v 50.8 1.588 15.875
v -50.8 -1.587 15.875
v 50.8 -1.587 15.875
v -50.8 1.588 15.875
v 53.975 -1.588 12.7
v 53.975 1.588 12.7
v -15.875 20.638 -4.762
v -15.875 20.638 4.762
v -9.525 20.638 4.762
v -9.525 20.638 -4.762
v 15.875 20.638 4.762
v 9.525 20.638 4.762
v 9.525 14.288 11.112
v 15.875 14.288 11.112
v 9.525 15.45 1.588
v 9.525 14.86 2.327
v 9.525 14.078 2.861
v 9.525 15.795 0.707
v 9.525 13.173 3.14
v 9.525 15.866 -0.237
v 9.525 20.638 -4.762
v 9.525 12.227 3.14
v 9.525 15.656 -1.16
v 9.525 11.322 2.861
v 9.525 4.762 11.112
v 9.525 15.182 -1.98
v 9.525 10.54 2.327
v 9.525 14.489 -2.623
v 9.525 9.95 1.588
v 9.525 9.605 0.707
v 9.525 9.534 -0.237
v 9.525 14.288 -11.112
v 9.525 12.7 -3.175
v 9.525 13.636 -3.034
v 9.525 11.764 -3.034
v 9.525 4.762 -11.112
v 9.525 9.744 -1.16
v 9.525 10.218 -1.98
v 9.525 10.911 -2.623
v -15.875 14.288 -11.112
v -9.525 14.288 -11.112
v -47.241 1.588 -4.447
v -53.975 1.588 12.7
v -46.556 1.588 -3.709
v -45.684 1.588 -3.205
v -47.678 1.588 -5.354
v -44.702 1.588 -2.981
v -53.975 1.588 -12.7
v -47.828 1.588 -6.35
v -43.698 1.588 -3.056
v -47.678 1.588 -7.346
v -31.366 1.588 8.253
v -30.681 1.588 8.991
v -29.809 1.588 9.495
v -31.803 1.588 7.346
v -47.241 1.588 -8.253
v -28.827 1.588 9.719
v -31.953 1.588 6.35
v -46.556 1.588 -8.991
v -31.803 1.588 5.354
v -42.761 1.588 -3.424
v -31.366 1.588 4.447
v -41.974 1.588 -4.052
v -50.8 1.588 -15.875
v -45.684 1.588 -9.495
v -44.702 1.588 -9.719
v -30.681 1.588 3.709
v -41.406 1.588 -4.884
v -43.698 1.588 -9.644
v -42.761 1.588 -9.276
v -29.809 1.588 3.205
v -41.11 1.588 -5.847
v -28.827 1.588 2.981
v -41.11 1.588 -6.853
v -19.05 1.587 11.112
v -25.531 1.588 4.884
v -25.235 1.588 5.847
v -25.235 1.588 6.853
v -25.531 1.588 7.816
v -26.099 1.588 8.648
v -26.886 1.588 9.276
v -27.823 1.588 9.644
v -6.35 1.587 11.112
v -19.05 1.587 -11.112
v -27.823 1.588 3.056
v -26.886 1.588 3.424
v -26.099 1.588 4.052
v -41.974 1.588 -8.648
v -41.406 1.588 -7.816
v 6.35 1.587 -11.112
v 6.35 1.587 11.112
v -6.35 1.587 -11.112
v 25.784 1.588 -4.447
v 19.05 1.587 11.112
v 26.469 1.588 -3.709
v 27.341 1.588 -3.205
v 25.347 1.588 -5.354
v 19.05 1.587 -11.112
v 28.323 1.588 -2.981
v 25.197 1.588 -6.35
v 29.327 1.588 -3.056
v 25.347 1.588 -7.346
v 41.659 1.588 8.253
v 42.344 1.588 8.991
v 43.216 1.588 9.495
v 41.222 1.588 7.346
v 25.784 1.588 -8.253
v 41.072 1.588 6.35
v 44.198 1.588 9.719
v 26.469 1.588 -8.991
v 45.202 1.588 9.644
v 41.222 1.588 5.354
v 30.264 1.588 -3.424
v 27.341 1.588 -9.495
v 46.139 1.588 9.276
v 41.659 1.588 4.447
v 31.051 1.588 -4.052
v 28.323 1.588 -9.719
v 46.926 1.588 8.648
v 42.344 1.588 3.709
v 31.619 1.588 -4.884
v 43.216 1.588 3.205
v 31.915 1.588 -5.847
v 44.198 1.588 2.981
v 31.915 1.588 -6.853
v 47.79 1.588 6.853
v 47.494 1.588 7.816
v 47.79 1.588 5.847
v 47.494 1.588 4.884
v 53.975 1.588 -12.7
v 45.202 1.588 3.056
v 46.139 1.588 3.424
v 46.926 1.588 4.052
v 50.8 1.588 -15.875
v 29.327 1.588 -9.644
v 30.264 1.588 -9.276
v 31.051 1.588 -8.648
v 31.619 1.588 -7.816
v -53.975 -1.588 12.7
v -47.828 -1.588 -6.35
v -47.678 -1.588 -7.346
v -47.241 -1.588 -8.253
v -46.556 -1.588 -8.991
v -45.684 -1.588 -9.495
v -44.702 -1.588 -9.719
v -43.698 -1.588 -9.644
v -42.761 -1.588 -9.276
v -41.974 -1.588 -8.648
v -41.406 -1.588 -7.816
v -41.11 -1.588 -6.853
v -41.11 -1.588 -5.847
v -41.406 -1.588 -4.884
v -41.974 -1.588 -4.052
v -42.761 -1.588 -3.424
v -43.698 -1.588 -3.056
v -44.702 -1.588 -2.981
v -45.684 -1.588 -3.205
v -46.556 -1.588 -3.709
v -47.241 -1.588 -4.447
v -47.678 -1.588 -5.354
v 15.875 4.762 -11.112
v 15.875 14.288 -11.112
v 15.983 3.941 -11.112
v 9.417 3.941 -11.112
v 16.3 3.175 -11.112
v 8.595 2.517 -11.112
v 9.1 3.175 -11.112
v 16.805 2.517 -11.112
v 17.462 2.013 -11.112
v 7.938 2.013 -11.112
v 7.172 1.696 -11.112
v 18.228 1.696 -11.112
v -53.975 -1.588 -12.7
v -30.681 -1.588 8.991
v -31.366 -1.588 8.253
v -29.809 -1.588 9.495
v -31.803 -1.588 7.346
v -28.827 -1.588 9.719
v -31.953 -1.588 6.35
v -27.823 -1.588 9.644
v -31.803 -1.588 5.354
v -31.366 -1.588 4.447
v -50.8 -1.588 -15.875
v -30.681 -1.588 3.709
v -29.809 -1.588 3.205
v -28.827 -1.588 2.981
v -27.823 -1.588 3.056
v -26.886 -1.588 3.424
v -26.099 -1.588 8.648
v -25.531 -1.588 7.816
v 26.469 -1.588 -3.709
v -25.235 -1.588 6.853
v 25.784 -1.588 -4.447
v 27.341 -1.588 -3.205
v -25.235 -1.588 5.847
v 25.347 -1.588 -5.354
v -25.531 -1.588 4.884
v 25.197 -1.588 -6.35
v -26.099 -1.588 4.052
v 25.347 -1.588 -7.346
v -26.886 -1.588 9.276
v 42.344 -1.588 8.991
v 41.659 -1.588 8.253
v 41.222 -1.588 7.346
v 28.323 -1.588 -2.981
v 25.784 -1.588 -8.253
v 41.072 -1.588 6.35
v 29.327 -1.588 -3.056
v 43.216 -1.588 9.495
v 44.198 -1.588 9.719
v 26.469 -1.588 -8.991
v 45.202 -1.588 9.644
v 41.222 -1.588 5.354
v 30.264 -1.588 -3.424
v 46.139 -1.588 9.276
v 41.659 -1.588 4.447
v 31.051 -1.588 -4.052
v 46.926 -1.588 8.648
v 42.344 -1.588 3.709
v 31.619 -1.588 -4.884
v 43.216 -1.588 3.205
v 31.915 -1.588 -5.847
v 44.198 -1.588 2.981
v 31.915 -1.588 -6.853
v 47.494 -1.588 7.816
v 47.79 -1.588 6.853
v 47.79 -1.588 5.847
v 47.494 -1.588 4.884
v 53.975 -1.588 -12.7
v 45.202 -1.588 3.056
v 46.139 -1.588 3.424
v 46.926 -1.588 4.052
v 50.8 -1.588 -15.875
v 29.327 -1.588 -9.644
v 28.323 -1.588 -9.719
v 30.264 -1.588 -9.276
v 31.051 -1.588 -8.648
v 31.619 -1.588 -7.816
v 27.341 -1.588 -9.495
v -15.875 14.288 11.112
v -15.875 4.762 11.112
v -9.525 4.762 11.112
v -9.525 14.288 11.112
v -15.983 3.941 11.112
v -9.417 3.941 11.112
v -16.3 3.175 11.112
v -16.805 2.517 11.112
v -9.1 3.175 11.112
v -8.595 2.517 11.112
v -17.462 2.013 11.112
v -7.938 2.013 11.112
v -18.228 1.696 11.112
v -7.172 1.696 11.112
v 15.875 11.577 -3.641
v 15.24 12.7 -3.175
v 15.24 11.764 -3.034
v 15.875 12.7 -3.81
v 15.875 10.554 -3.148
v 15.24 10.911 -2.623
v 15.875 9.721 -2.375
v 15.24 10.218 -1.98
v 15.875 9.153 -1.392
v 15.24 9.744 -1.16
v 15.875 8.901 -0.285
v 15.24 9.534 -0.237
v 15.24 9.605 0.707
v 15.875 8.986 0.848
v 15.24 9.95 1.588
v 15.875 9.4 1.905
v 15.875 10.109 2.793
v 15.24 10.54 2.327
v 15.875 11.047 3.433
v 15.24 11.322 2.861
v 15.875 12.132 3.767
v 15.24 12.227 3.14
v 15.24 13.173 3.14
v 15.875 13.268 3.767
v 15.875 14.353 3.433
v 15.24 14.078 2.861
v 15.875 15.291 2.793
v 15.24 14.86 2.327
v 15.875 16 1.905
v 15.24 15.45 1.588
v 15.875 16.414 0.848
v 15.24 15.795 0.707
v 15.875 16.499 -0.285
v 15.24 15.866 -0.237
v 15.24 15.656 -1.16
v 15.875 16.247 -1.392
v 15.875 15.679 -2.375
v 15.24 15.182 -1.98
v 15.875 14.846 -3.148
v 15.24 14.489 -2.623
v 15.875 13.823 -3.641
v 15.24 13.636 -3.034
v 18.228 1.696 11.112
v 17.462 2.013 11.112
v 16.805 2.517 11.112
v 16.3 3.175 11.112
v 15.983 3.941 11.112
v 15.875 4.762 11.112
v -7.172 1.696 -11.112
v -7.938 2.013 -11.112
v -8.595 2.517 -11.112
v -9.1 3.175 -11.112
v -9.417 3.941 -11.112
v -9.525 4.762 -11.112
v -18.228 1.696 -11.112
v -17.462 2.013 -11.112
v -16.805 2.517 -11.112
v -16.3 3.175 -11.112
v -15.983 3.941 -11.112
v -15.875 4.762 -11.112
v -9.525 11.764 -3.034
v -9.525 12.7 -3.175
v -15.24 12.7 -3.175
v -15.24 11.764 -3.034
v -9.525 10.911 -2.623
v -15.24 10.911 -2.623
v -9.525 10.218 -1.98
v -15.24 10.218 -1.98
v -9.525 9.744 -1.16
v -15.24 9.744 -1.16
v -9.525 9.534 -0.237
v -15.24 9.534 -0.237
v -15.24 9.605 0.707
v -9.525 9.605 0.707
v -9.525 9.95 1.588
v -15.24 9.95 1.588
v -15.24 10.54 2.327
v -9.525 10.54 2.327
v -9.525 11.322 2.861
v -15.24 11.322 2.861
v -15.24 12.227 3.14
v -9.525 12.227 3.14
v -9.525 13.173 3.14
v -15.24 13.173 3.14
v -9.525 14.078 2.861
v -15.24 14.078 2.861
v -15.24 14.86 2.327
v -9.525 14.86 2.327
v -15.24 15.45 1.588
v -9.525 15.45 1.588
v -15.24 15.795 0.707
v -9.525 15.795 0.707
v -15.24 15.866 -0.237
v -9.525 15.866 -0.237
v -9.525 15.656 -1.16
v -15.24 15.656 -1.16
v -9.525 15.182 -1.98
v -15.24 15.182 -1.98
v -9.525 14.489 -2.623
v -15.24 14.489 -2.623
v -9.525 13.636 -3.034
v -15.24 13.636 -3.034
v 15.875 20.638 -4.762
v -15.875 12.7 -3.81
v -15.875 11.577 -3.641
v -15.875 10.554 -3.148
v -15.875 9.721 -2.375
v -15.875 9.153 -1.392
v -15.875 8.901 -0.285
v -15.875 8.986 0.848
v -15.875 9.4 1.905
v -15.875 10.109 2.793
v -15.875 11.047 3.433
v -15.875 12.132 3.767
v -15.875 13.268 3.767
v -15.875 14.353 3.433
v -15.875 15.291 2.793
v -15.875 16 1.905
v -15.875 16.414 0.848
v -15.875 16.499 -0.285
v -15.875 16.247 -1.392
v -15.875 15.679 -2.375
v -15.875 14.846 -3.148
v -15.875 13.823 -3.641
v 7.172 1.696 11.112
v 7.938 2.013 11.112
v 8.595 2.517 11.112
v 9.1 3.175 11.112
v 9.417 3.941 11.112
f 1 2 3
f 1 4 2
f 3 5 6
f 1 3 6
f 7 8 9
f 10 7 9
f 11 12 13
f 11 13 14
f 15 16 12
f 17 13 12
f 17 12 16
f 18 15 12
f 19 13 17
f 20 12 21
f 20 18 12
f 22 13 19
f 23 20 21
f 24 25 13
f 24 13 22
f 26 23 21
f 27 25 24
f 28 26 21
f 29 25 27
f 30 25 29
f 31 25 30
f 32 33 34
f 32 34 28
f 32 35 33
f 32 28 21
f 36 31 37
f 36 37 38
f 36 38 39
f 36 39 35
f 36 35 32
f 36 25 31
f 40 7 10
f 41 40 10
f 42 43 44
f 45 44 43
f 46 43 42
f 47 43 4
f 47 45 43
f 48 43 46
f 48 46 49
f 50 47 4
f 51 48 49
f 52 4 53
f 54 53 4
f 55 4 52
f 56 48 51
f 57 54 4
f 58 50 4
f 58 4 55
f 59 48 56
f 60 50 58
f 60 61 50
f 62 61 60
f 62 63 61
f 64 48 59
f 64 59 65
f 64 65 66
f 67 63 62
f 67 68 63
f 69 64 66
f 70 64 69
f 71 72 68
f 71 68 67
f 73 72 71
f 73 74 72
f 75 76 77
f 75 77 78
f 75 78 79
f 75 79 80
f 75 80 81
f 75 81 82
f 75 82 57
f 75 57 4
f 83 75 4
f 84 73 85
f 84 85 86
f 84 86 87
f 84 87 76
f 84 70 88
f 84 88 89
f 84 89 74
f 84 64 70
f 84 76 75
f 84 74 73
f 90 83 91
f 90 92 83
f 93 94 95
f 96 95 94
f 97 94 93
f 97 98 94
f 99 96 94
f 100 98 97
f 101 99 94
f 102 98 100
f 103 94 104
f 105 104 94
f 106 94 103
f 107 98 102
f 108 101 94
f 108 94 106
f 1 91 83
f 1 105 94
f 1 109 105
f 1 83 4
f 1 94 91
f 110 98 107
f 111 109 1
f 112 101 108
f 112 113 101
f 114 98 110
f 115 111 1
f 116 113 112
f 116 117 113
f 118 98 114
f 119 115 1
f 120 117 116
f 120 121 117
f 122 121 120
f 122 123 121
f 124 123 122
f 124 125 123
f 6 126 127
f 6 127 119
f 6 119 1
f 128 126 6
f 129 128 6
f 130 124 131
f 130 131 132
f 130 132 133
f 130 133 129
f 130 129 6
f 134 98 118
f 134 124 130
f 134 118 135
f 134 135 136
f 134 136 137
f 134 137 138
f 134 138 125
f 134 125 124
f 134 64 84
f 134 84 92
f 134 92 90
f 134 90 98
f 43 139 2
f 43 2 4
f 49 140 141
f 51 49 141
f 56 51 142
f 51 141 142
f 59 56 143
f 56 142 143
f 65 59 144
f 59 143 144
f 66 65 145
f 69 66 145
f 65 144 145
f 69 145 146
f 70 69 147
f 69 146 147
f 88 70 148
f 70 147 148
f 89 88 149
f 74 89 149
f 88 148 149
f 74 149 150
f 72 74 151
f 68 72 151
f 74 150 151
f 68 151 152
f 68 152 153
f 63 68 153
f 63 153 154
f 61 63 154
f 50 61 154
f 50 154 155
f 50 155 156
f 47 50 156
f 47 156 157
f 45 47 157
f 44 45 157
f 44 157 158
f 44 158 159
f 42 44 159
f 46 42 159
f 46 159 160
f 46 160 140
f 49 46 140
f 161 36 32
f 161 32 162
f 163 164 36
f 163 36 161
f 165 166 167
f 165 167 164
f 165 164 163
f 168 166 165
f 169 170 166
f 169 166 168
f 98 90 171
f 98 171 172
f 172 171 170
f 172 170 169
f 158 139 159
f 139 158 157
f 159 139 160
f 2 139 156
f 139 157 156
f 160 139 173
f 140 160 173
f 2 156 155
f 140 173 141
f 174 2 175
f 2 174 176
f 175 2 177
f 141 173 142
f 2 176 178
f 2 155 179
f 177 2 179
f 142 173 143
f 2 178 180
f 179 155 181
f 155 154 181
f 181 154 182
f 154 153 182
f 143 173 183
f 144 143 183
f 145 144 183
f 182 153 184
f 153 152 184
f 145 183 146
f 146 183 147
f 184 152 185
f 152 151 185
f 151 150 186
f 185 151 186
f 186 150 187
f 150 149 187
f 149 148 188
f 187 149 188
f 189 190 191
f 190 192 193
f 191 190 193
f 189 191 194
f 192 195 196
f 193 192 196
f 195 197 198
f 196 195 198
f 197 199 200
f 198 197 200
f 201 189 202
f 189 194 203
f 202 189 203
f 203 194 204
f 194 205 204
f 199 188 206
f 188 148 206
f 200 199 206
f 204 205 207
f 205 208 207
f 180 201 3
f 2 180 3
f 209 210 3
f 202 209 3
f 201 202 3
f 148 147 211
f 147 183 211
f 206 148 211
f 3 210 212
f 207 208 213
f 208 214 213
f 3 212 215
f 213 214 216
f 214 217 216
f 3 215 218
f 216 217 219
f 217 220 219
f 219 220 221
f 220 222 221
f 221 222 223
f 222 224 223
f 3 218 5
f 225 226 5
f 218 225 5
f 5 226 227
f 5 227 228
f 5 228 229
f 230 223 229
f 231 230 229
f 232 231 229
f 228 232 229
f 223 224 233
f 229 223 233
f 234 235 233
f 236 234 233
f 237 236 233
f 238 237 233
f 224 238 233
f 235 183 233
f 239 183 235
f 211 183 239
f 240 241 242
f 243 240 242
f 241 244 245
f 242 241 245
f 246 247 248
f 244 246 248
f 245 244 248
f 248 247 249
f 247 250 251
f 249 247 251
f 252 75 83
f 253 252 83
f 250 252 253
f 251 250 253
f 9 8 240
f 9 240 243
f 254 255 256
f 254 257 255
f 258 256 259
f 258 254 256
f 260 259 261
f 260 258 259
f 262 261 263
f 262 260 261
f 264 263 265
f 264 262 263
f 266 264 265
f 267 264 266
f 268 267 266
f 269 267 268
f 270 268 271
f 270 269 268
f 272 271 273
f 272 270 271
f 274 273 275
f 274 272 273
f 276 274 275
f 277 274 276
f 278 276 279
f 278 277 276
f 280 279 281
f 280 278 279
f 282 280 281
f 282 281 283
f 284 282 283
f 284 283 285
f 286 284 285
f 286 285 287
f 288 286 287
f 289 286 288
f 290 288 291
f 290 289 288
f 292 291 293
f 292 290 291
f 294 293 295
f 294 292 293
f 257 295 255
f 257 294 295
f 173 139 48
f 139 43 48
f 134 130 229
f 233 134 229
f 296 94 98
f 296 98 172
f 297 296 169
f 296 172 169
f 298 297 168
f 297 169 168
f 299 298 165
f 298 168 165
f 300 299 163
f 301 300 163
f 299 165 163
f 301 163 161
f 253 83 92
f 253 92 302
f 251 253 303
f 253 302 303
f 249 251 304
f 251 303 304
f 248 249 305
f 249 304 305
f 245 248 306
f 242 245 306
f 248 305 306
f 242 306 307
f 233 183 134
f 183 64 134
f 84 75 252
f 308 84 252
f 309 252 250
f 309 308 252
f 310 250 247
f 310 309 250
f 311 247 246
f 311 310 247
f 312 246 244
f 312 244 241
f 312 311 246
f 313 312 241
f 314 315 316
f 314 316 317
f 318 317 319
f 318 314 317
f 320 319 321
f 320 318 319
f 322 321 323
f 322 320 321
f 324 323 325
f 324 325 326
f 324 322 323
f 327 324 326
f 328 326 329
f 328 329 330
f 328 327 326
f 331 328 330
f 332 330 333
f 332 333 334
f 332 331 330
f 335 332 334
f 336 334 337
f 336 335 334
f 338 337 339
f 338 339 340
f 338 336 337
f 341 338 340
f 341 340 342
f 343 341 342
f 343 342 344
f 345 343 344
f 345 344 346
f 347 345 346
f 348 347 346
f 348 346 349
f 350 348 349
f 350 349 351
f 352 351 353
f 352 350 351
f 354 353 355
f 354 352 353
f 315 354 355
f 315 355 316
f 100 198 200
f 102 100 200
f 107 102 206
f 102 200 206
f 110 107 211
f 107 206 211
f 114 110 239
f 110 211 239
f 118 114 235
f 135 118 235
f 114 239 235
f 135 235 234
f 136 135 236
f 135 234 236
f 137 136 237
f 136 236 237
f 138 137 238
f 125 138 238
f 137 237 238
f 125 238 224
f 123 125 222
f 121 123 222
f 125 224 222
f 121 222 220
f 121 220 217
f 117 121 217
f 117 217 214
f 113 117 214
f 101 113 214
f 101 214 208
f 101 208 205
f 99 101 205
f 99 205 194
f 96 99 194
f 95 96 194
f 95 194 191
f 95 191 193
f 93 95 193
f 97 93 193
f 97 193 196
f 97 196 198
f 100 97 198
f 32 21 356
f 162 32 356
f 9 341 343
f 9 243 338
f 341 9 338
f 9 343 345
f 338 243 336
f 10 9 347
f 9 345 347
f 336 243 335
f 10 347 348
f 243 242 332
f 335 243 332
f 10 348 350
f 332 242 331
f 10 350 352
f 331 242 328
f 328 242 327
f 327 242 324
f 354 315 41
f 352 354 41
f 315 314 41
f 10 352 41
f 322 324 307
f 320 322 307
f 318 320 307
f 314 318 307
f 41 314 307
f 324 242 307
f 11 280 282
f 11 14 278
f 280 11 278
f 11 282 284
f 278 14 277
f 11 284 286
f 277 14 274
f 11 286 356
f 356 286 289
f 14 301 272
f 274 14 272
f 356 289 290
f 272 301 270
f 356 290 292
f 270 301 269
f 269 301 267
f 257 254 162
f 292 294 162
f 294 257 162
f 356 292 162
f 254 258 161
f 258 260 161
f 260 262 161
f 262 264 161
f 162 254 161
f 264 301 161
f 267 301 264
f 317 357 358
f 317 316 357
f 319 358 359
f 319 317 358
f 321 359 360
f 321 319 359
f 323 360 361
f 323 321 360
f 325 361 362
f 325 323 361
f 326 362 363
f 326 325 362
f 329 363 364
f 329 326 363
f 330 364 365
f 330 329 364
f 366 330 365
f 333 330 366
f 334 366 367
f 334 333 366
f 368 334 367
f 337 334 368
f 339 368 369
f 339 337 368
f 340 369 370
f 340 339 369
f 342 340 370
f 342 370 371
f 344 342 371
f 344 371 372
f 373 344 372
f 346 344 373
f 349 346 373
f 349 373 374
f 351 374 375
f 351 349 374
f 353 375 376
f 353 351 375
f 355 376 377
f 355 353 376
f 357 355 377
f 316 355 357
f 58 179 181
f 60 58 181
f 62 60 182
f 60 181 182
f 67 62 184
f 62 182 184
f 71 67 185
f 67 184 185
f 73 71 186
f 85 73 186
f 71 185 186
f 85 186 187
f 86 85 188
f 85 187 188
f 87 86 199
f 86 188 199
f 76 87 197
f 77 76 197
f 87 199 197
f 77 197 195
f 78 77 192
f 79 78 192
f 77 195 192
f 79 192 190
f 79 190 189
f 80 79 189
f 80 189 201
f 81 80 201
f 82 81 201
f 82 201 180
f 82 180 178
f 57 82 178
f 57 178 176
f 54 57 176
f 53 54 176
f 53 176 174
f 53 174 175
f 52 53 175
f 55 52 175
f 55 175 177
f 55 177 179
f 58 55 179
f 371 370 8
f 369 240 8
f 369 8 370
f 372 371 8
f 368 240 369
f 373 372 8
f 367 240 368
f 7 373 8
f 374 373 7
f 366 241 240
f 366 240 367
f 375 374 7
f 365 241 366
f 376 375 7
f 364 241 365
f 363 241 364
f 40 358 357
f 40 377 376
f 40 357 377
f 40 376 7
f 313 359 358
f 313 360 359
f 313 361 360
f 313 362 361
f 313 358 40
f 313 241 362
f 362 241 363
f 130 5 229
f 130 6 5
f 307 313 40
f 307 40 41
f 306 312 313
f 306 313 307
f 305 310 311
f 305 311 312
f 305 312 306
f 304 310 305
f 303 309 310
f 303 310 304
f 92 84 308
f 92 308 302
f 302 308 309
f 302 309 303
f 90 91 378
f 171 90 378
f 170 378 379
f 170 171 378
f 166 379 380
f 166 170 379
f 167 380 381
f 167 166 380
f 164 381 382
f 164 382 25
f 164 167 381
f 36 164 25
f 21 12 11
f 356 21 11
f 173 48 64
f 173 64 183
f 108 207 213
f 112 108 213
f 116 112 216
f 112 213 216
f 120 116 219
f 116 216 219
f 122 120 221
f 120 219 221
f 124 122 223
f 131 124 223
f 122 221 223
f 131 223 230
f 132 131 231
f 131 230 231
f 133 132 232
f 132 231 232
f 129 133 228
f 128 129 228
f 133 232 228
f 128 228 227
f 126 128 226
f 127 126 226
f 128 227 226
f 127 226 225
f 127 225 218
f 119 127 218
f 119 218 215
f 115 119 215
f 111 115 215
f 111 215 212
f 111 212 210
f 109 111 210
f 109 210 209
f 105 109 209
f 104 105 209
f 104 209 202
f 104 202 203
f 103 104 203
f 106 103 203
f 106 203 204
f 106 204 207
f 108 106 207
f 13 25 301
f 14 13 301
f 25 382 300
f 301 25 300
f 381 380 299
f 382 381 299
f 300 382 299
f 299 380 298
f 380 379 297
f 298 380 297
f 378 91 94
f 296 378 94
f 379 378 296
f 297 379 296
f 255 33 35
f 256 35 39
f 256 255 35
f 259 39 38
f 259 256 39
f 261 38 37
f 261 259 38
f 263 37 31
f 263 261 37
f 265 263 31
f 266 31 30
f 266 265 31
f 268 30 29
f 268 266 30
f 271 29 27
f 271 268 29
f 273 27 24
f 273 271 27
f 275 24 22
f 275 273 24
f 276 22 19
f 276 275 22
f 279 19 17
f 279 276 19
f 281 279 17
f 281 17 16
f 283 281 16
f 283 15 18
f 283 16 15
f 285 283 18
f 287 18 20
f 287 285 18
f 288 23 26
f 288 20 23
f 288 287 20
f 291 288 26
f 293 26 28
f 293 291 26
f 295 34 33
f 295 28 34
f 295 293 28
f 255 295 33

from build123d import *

# Parameters (mm, degrees)
SKETCH1_W               = 107.95
SKETCH1_H               = 31.75
BOSS_EXTRUDE1_DEPTH     = 1.5875
F_1_4_CLEARANCE_HOLE1_D = 6.7564
SKETCH4_W               = 6.35
SKETCH4_H               = 22.225
BOSS_EXTRUDE2_DEPTH     = 19.05
CHAMFER2_SIZE           = 3.175
FILLET1_R               = 3.175
CHAMFER3_SIZE           = 6.35


with BuildPart() as part:
    # Sketch1 → Boss-Extrude1 (new, symmetric)
    with BuildSketch(Plane(origin=(0, 0, 0), x_dir=(1, 0, 0), z_dir=(0, 1, 0))):
        Rectangle(SKETCH1_W, SKETCH1_H)
    extrude(amount=BOSS_EXTRUDE1_DEPTH, both=True)

    # 1/4 Clearance Hole1 (through all)
    with Locations(Plane(origin=(0, 1.5875, 0), x_dir=(1, 0, 0), z_dir=(0, 1, 0))):
        with Locations((-44.45, 6.35), (28.575, 6.35), (-28.575, -6.35), (44.45, -6.35)):
            Hole(F_1_4_CLEARANCE_HOLE1_D / 2)

    # Sketch4 → Boss-Extrude2 (add)
    with BuildSketch(Plane(origin=(0, 1.5875, 0), x_dir=(1, 0, 0), z_dir=(0, 1, 0))):
        with Locations((-12.7, 0)):
            Rectangle(SKETCH4_W, SKETCH4_H)
        with Locations((12.7, 0)):
            Rectangle(SKETCH4_W, SKETCH4_H)
    extrude(amount=BOSS_EXTRUDE2_DEPTH)

    # Chamfer2
    chamfer2_edges = [part.edges().sort_by_distance(p)[0] for p in [
        (-53.975, 0, -15.875),
        (53.975, 0, -15.875),
        (53.975, 0, 15.875),
        (-53.975, 0, 15.875),
    ]]
    chamfer(chamfer2_edges, length=CHAMFER2_SIZE)

    # Fillet1
    fillet1_edges = [part.edges().sort_by_distance(p)[0] for p in [
        (-15.875, 1.5875, 0),
        (-9.525, 1.5875, 0),
        (9.525, 1.5875, 0),
        (15.875, 1.5875, 0),
    ]]
    fillet(fillet1_edges, radius=FILLET1_R)

    # Sketch6 → 1/4 (0.25) Diameter Hole1 (revolve, cut)
    with BuildSketch(Plane(origin=(15.875, 12.7, 0), x_dir=(0, 0, -1), z_dir=(0, 1, 0))):
        Polygon((0, 0), (0, 31.75), (3.81, 31.75), (3.175, 31.115), (3.175, 0.635), (3.81, 0), align=None)
    revolve(axis=Axis((22.225, 12.7, 0), (-1, 0, 0)), mode=Mode.SUBTRACT)

    # Chamfer3
    chamfer3_edges = [part.edges().sort_by_distance(p)[0] for p in [
        (-12.7, 20.6375, 11.1125),
        (-12.7, 20.6375, -11.1125),
        (12.7, 20.6375, 11.1125),
        (12.7, 20.6375, -11.1125),
    ]]
    chamfer(chamfer3_edges, length=CHAMFER3_SIZE)


solid = part.part
